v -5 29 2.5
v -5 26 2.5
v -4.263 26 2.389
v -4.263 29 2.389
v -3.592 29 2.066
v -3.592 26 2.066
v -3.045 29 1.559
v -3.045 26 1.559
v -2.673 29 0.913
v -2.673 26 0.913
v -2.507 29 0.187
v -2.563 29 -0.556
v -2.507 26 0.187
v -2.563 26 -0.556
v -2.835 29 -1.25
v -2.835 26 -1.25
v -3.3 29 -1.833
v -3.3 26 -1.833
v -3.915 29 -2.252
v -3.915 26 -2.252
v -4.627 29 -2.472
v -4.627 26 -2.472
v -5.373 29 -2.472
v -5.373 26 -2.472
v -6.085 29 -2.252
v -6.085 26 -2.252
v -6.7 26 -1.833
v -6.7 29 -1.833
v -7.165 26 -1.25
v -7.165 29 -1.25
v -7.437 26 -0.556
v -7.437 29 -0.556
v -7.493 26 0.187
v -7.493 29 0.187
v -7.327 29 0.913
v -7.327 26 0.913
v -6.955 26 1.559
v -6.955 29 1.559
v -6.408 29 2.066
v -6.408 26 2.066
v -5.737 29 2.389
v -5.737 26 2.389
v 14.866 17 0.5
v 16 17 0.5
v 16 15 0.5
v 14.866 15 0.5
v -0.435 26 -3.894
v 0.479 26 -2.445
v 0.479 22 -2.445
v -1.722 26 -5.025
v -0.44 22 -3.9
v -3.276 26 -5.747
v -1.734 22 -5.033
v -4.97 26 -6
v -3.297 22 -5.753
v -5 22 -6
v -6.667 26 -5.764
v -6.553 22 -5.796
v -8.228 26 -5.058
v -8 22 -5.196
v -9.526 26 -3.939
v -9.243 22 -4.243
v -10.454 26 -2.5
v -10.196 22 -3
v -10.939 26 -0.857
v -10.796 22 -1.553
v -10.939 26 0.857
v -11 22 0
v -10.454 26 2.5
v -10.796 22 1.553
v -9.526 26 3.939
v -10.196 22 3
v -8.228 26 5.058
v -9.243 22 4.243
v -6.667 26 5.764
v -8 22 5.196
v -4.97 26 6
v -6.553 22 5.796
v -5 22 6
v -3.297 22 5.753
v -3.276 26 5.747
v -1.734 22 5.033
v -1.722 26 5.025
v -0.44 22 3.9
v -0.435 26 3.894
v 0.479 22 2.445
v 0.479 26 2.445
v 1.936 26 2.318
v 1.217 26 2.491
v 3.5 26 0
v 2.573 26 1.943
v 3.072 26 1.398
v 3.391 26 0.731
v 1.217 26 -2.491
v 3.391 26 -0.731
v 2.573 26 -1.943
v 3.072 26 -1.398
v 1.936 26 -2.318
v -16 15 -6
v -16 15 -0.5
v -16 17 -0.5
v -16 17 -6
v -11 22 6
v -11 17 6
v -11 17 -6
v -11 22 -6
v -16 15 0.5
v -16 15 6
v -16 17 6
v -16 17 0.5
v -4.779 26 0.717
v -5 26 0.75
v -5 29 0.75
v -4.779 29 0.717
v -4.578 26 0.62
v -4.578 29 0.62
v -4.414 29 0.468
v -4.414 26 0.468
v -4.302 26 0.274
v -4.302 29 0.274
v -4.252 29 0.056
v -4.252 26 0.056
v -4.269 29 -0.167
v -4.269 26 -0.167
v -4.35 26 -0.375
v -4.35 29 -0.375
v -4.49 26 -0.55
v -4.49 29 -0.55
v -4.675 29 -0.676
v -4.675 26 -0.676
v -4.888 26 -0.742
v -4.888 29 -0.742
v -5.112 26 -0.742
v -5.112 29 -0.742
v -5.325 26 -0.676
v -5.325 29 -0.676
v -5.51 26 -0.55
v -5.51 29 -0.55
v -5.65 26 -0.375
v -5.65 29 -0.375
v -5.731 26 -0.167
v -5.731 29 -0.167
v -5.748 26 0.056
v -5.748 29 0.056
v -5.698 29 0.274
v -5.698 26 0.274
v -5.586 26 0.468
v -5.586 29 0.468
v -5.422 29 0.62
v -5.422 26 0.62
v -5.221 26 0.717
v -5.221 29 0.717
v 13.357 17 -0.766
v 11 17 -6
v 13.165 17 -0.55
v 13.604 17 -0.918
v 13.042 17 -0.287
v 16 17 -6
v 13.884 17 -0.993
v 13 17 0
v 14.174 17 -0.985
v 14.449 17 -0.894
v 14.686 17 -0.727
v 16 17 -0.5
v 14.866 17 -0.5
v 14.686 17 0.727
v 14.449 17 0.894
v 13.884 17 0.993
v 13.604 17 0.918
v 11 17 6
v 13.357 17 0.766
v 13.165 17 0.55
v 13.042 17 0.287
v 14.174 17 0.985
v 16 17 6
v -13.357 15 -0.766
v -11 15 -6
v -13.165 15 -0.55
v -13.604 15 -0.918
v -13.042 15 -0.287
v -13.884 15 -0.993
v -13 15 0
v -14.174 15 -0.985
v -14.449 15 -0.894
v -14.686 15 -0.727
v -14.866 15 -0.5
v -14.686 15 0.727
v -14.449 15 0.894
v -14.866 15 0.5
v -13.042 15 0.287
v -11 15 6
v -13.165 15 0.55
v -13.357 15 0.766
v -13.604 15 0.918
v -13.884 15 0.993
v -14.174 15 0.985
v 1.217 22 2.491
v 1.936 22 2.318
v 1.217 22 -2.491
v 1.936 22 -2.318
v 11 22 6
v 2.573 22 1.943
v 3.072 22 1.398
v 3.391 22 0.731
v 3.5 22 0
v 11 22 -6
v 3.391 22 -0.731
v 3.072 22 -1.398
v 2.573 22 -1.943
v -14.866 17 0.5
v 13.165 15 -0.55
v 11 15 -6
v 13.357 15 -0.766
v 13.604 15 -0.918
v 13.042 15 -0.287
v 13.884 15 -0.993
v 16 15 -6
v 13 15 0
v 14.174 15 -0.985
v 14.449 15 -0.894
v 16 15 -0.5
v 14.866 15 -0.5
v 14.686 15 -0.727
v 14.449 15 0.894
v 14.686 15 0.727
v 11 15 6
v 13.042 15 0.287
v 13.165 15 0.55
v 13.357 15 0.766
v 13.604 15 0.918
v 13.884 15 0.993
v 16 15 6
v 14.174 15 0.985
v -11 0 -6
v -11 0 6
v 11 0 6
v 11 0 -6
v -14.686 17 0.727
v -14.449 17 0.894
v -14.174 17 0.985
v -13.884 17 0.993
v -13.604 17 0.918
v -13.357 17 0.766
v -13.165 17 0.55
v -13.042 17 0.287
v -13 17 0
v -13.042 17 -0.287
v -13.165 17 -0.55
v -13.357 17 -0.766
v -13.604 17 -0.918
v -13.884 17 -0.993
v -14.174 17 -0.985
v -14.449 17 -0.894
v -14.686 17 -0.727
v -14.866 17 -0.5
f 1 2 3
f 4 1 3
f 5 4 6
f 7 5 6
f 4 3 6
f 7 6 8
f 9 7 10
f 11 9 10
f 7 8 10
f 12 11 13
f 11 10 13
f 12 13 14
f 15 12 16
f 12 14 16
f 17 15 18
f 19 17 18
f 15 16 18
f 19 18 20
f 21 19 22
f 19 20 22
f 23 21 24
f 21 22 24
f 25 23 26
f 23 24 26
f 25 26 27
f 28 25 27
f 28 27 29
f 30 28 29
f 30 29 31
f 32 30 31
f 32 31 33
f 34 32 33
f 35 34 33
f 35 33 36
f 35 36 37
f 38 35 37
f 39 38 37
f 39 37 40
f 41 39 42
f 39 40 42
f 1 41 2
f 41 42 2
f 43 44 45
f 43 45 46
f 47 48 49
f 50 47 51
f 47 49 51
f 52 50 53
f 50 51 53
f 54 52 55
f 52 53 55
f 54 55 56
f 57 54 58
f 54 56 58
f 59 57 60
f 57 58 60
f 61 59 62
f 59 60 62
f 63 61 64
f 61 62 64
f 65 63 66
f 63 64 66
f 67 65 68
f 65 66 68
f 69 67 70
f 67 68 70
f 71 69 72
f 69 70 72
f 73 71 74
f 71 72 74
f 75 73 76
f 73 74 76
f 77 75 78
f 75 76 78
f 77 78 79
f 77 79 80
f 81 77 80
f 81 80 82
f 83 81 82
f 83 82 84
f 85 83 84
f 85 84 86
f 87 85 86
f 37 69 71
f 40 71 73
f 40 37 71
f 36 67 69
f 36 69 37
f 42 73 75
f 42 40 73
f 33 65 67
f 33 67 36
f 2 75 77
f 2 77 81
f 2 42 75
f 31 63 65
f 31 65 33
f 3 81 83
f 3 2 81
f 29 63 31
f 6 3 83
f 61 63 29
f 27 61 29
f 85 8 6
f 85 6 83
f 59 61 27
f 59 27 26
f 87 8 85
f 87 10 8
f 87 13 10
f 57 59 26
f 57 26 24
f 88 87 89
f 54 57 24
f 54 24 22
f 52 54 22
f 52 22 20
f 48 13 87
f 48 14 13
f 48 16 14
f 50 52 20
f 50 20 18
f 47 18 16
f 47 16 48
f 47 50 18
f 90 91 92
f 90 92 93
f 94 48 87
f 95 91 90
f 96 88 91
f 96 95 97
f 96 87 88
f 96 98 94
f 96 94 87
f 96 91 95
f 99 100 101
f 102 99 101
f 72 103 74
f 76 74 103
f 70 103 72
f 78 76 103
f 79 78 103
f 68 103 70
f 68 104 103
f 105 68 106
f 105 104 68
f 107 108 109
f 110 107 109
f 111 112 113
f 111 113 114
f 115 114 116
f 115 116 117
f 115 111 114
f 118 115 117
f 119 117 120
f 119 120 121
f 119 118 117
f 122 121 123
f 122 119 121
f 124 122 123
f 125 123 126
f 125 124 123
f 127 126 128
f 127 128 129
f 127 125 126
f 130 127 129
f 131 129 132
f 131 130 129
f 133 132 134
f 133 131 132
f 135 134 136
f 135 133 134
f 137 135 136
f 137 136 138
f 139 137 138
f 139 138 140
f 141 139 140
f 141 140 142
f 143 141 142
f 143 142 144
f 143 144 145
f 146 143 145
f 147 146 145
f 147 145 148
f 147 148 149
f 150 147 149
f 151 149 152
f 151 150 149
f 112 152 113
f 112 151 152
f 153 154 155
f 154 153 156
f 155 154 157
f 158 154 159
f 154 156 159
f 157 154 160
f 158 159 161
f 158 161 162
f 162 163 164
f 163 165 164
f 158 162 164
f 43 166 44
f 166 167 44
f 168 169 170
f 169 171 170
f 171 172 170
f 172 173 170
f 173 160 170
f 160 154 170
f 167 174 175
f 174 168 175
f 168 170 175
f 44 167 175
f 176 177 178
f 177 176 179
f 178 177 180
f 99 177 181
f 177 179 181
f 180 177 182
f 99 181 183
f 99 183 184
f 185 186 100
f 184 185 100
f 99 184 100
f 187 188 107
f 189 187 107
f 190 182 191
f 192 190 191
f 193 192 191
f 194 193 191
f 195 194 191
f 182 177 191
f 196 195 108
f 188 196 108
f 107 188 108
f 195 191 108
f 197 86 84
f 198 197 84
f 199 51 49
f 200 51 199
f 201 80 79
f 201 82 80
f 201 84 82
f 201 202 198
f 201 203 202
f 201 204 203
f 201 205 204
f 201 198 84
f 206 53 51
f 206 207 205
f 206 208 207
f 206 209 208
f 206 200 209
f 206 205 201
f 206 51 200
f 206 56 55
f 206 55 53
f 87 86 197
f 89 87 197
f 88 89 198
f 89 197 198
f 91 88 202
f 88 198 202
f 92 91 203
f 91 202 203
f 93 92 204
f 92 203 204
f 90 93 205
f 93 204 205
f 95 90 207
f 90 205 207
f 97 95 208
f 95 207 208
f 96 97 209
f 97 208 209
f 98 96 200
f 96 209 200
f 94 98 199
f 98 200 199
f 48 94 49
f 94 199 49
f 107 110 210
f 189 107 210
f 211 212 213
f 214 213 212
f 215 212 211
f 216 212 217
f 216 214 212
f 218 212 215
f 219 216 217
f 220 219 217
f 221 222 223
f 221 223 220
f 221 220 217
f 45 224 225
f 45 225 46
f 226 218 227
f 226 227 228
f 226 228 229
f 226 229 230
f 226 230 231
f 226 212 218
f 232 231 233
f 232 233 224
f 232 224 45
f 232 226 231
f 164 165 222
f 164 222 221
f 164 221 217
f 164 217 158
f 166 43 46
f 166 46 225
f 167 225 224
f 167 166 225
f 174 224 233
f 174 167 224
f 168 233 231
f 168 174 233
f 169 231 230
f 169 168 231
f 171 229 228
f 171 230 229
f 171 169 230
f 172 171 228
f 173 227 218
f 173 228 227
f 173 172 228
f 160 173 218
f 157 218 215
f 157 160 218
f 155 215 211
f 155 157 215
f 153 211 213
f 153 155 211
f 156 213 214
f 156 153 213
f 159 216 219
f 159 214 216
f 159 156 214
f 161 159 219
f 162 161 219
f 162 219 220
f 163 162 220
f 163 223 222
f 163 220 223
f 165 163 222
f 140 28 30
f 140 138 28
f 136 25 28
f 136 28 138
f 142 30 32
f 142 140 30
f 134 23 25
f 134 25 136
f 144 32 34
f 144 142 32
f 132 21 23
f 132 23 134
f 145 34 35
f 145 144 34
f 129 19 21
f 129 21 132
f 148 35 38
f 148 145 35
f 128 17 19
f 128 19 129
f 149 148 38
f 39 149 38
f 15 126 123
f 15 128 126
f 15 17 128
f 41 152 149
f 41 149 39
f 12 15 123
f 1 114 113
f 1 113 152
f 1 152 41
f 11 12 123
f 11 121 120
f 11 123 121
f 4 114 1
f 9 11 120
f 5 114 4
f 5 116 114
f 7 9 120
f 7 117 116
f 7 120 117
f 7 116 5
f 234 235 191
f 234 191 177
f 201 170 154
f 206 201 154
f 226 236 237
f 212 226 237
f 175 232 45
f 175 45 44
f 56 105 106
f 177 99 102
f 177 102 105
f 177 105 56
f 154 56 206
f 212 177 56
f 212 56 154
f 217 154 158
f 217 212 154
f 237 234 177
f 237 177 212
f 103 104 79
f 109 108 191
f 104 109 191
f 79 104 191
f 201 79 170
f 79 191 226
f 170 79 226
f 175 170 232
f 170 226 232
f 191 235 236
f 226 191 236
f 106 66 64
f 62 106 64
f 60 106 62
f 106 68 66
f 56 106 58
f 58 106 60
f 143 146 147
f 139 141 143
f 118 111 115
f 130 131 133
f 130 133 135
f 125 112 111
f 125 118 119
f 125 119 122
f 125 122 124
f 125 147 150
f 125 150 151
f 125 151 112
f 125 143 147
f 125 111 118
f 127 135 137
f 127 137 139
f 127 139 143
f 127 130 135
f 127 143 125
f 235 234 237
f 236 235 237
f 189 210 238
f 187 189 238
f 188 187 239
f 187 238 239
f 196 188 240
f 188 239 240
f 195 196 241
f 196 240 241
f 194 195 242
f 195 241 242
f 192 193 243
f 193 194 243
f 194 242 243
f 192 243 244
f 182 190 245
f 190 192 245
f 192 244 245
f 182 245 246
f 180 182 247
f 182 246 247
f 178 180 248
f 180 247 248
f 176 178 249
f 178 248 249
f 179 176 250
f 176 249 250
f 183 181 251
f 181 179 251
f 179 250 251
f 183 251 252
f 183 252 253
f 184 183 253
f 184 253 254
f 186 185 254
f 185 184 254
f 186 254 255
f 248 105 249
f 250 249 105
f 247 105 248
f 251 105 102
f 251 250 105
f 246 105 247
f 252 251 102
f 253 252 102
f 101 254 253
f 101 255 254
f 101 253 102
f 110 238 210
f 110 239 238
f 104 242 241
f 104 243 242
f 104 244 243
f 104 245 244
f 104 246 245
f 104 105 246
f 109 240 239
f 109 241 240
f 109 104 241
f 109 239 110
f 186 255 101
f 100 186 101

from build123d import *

# Parameters (mm, degrees)
SKETCH1_W           = 22
SKETCH1_H           = 12
BOSS_EXTRUDE1_DEPTH = 22
BOSS_EXTRUDE2_DEPTH = 4
SKETCH3_W           = 5
SKETCH3_H           = 2
BOSS_EXTRUDE3_DEPTH = 12
CUT_EXTRUDE1_REACH  = 26.104
SKETCH5_R           = 2.5
SKETCH5_R_2         = 0.75
BOSS_EXTRUDE4_DEPTH = 3


with BuildPart() as part:
    # Sketch1 → Boss-Extrude1 (new body)
    with BuildSketch(Plane(origin=(0, 0, 0), x_dir=(1, 0, 0), z_dir=(0, 1, 0))):
        Rectangle(SKETCH1_W, SKETCH1_H)
    extrude(amount=BOSS_EXTRUDE1_DEPTH)

    # Sketch2 → Boss-Extrude2 (add)
    with BuildSketch(Plane(origin=(0, 22, 0), x_dir=(1, 0, 0), z_dir=(0, 1, 0))):
        with BuildLine():
            ThreePointArc((0.479166667, 2.445144707), (-11, 0), (0.479166667, -2.445144707))
            ThreePointArc((0.479166667, -2.445144707), (3.5, 0), (0.479166667, 2.445144707))
        make_face()
    extrude(amount=BOSS_EXTRUDE2_DEPTH)

    # Sketch3 → Boss-Extrude3 (add)
    with BuildSketch(Plane.XY.offset(6)):
        with Locations((13.5, 16)):
            Rectangle(SKETCH3_W, SKETCH3_H)
    boss_extrude3 = extrude(amount=-BOSS_EXTRUDE3_DEPTH)

    # Sketch4 → Cut-Extrude1 (cut, up to next)
    with BuildSketch(Plane(origin=(0, 17, 0), x_dir=(1, 0, 0), z_dir=(0, 1, 0)), mode=Mode.PRIVATE) as cut_extrude1_sk1:
        with BuildLine():
            Line((14.866025404, 0.5), (16, 0.5))
            Line((16, 0.5), (16, -0.5))
            Line((16, -0.5), (14.866025404, -0.5))
            ThreePointArc((14.866025404, -0.5), (13, 0), (14.866025404, 0.5))
        make_face()
    cut_extrude1_tool1 = extrude(cut_extrude1_sk1.sketch, amount=-CUT_EXTRUDE1_REACH, mode=Mode.PRIVATE) & part.part
    cut_extrude1 = cut_extrude1_tool1.solids().sort_by_distance((14.368381, 17, 0))[0]
    add(cut_extrude1, mode=Mode.SUBTRACT)

    # Mirror1: Boss-Extrude3, Cut-Extrude1 across plane
    add(boss_extrude3.mirror(Plane(origin=(0, 0, 0), x_dir=(0, 0, 1), z_dir=(1, 0, 0))))
    add(cut_extrude1.mirror(Plane(origin=(0, 0, 0), x_dir=(0, 0, 1), z_dir=(1, 0, 0))), mode=Mode.SUBTRACT)

    # Sketch5 → Boss-Extrude4 (add)
    with BuildSketch(Plane(origin=(0, 26, 0), x_dir=(1, 0, 0), z_dir=(0, 1, 0))):
        with Locations(Location((-5, 0, 0), (0, 0, 270))):
            Circle(SKETCH5_R)
        with Locations(Location((-5, 0, 0), (0, 0, 270))):
            Circle(SKETCH5_R_2, mode=Mode.SUBTRACT)
    extrude(amount=BOSS_EXTRUDE4_DEPTH)


solid = part.part
